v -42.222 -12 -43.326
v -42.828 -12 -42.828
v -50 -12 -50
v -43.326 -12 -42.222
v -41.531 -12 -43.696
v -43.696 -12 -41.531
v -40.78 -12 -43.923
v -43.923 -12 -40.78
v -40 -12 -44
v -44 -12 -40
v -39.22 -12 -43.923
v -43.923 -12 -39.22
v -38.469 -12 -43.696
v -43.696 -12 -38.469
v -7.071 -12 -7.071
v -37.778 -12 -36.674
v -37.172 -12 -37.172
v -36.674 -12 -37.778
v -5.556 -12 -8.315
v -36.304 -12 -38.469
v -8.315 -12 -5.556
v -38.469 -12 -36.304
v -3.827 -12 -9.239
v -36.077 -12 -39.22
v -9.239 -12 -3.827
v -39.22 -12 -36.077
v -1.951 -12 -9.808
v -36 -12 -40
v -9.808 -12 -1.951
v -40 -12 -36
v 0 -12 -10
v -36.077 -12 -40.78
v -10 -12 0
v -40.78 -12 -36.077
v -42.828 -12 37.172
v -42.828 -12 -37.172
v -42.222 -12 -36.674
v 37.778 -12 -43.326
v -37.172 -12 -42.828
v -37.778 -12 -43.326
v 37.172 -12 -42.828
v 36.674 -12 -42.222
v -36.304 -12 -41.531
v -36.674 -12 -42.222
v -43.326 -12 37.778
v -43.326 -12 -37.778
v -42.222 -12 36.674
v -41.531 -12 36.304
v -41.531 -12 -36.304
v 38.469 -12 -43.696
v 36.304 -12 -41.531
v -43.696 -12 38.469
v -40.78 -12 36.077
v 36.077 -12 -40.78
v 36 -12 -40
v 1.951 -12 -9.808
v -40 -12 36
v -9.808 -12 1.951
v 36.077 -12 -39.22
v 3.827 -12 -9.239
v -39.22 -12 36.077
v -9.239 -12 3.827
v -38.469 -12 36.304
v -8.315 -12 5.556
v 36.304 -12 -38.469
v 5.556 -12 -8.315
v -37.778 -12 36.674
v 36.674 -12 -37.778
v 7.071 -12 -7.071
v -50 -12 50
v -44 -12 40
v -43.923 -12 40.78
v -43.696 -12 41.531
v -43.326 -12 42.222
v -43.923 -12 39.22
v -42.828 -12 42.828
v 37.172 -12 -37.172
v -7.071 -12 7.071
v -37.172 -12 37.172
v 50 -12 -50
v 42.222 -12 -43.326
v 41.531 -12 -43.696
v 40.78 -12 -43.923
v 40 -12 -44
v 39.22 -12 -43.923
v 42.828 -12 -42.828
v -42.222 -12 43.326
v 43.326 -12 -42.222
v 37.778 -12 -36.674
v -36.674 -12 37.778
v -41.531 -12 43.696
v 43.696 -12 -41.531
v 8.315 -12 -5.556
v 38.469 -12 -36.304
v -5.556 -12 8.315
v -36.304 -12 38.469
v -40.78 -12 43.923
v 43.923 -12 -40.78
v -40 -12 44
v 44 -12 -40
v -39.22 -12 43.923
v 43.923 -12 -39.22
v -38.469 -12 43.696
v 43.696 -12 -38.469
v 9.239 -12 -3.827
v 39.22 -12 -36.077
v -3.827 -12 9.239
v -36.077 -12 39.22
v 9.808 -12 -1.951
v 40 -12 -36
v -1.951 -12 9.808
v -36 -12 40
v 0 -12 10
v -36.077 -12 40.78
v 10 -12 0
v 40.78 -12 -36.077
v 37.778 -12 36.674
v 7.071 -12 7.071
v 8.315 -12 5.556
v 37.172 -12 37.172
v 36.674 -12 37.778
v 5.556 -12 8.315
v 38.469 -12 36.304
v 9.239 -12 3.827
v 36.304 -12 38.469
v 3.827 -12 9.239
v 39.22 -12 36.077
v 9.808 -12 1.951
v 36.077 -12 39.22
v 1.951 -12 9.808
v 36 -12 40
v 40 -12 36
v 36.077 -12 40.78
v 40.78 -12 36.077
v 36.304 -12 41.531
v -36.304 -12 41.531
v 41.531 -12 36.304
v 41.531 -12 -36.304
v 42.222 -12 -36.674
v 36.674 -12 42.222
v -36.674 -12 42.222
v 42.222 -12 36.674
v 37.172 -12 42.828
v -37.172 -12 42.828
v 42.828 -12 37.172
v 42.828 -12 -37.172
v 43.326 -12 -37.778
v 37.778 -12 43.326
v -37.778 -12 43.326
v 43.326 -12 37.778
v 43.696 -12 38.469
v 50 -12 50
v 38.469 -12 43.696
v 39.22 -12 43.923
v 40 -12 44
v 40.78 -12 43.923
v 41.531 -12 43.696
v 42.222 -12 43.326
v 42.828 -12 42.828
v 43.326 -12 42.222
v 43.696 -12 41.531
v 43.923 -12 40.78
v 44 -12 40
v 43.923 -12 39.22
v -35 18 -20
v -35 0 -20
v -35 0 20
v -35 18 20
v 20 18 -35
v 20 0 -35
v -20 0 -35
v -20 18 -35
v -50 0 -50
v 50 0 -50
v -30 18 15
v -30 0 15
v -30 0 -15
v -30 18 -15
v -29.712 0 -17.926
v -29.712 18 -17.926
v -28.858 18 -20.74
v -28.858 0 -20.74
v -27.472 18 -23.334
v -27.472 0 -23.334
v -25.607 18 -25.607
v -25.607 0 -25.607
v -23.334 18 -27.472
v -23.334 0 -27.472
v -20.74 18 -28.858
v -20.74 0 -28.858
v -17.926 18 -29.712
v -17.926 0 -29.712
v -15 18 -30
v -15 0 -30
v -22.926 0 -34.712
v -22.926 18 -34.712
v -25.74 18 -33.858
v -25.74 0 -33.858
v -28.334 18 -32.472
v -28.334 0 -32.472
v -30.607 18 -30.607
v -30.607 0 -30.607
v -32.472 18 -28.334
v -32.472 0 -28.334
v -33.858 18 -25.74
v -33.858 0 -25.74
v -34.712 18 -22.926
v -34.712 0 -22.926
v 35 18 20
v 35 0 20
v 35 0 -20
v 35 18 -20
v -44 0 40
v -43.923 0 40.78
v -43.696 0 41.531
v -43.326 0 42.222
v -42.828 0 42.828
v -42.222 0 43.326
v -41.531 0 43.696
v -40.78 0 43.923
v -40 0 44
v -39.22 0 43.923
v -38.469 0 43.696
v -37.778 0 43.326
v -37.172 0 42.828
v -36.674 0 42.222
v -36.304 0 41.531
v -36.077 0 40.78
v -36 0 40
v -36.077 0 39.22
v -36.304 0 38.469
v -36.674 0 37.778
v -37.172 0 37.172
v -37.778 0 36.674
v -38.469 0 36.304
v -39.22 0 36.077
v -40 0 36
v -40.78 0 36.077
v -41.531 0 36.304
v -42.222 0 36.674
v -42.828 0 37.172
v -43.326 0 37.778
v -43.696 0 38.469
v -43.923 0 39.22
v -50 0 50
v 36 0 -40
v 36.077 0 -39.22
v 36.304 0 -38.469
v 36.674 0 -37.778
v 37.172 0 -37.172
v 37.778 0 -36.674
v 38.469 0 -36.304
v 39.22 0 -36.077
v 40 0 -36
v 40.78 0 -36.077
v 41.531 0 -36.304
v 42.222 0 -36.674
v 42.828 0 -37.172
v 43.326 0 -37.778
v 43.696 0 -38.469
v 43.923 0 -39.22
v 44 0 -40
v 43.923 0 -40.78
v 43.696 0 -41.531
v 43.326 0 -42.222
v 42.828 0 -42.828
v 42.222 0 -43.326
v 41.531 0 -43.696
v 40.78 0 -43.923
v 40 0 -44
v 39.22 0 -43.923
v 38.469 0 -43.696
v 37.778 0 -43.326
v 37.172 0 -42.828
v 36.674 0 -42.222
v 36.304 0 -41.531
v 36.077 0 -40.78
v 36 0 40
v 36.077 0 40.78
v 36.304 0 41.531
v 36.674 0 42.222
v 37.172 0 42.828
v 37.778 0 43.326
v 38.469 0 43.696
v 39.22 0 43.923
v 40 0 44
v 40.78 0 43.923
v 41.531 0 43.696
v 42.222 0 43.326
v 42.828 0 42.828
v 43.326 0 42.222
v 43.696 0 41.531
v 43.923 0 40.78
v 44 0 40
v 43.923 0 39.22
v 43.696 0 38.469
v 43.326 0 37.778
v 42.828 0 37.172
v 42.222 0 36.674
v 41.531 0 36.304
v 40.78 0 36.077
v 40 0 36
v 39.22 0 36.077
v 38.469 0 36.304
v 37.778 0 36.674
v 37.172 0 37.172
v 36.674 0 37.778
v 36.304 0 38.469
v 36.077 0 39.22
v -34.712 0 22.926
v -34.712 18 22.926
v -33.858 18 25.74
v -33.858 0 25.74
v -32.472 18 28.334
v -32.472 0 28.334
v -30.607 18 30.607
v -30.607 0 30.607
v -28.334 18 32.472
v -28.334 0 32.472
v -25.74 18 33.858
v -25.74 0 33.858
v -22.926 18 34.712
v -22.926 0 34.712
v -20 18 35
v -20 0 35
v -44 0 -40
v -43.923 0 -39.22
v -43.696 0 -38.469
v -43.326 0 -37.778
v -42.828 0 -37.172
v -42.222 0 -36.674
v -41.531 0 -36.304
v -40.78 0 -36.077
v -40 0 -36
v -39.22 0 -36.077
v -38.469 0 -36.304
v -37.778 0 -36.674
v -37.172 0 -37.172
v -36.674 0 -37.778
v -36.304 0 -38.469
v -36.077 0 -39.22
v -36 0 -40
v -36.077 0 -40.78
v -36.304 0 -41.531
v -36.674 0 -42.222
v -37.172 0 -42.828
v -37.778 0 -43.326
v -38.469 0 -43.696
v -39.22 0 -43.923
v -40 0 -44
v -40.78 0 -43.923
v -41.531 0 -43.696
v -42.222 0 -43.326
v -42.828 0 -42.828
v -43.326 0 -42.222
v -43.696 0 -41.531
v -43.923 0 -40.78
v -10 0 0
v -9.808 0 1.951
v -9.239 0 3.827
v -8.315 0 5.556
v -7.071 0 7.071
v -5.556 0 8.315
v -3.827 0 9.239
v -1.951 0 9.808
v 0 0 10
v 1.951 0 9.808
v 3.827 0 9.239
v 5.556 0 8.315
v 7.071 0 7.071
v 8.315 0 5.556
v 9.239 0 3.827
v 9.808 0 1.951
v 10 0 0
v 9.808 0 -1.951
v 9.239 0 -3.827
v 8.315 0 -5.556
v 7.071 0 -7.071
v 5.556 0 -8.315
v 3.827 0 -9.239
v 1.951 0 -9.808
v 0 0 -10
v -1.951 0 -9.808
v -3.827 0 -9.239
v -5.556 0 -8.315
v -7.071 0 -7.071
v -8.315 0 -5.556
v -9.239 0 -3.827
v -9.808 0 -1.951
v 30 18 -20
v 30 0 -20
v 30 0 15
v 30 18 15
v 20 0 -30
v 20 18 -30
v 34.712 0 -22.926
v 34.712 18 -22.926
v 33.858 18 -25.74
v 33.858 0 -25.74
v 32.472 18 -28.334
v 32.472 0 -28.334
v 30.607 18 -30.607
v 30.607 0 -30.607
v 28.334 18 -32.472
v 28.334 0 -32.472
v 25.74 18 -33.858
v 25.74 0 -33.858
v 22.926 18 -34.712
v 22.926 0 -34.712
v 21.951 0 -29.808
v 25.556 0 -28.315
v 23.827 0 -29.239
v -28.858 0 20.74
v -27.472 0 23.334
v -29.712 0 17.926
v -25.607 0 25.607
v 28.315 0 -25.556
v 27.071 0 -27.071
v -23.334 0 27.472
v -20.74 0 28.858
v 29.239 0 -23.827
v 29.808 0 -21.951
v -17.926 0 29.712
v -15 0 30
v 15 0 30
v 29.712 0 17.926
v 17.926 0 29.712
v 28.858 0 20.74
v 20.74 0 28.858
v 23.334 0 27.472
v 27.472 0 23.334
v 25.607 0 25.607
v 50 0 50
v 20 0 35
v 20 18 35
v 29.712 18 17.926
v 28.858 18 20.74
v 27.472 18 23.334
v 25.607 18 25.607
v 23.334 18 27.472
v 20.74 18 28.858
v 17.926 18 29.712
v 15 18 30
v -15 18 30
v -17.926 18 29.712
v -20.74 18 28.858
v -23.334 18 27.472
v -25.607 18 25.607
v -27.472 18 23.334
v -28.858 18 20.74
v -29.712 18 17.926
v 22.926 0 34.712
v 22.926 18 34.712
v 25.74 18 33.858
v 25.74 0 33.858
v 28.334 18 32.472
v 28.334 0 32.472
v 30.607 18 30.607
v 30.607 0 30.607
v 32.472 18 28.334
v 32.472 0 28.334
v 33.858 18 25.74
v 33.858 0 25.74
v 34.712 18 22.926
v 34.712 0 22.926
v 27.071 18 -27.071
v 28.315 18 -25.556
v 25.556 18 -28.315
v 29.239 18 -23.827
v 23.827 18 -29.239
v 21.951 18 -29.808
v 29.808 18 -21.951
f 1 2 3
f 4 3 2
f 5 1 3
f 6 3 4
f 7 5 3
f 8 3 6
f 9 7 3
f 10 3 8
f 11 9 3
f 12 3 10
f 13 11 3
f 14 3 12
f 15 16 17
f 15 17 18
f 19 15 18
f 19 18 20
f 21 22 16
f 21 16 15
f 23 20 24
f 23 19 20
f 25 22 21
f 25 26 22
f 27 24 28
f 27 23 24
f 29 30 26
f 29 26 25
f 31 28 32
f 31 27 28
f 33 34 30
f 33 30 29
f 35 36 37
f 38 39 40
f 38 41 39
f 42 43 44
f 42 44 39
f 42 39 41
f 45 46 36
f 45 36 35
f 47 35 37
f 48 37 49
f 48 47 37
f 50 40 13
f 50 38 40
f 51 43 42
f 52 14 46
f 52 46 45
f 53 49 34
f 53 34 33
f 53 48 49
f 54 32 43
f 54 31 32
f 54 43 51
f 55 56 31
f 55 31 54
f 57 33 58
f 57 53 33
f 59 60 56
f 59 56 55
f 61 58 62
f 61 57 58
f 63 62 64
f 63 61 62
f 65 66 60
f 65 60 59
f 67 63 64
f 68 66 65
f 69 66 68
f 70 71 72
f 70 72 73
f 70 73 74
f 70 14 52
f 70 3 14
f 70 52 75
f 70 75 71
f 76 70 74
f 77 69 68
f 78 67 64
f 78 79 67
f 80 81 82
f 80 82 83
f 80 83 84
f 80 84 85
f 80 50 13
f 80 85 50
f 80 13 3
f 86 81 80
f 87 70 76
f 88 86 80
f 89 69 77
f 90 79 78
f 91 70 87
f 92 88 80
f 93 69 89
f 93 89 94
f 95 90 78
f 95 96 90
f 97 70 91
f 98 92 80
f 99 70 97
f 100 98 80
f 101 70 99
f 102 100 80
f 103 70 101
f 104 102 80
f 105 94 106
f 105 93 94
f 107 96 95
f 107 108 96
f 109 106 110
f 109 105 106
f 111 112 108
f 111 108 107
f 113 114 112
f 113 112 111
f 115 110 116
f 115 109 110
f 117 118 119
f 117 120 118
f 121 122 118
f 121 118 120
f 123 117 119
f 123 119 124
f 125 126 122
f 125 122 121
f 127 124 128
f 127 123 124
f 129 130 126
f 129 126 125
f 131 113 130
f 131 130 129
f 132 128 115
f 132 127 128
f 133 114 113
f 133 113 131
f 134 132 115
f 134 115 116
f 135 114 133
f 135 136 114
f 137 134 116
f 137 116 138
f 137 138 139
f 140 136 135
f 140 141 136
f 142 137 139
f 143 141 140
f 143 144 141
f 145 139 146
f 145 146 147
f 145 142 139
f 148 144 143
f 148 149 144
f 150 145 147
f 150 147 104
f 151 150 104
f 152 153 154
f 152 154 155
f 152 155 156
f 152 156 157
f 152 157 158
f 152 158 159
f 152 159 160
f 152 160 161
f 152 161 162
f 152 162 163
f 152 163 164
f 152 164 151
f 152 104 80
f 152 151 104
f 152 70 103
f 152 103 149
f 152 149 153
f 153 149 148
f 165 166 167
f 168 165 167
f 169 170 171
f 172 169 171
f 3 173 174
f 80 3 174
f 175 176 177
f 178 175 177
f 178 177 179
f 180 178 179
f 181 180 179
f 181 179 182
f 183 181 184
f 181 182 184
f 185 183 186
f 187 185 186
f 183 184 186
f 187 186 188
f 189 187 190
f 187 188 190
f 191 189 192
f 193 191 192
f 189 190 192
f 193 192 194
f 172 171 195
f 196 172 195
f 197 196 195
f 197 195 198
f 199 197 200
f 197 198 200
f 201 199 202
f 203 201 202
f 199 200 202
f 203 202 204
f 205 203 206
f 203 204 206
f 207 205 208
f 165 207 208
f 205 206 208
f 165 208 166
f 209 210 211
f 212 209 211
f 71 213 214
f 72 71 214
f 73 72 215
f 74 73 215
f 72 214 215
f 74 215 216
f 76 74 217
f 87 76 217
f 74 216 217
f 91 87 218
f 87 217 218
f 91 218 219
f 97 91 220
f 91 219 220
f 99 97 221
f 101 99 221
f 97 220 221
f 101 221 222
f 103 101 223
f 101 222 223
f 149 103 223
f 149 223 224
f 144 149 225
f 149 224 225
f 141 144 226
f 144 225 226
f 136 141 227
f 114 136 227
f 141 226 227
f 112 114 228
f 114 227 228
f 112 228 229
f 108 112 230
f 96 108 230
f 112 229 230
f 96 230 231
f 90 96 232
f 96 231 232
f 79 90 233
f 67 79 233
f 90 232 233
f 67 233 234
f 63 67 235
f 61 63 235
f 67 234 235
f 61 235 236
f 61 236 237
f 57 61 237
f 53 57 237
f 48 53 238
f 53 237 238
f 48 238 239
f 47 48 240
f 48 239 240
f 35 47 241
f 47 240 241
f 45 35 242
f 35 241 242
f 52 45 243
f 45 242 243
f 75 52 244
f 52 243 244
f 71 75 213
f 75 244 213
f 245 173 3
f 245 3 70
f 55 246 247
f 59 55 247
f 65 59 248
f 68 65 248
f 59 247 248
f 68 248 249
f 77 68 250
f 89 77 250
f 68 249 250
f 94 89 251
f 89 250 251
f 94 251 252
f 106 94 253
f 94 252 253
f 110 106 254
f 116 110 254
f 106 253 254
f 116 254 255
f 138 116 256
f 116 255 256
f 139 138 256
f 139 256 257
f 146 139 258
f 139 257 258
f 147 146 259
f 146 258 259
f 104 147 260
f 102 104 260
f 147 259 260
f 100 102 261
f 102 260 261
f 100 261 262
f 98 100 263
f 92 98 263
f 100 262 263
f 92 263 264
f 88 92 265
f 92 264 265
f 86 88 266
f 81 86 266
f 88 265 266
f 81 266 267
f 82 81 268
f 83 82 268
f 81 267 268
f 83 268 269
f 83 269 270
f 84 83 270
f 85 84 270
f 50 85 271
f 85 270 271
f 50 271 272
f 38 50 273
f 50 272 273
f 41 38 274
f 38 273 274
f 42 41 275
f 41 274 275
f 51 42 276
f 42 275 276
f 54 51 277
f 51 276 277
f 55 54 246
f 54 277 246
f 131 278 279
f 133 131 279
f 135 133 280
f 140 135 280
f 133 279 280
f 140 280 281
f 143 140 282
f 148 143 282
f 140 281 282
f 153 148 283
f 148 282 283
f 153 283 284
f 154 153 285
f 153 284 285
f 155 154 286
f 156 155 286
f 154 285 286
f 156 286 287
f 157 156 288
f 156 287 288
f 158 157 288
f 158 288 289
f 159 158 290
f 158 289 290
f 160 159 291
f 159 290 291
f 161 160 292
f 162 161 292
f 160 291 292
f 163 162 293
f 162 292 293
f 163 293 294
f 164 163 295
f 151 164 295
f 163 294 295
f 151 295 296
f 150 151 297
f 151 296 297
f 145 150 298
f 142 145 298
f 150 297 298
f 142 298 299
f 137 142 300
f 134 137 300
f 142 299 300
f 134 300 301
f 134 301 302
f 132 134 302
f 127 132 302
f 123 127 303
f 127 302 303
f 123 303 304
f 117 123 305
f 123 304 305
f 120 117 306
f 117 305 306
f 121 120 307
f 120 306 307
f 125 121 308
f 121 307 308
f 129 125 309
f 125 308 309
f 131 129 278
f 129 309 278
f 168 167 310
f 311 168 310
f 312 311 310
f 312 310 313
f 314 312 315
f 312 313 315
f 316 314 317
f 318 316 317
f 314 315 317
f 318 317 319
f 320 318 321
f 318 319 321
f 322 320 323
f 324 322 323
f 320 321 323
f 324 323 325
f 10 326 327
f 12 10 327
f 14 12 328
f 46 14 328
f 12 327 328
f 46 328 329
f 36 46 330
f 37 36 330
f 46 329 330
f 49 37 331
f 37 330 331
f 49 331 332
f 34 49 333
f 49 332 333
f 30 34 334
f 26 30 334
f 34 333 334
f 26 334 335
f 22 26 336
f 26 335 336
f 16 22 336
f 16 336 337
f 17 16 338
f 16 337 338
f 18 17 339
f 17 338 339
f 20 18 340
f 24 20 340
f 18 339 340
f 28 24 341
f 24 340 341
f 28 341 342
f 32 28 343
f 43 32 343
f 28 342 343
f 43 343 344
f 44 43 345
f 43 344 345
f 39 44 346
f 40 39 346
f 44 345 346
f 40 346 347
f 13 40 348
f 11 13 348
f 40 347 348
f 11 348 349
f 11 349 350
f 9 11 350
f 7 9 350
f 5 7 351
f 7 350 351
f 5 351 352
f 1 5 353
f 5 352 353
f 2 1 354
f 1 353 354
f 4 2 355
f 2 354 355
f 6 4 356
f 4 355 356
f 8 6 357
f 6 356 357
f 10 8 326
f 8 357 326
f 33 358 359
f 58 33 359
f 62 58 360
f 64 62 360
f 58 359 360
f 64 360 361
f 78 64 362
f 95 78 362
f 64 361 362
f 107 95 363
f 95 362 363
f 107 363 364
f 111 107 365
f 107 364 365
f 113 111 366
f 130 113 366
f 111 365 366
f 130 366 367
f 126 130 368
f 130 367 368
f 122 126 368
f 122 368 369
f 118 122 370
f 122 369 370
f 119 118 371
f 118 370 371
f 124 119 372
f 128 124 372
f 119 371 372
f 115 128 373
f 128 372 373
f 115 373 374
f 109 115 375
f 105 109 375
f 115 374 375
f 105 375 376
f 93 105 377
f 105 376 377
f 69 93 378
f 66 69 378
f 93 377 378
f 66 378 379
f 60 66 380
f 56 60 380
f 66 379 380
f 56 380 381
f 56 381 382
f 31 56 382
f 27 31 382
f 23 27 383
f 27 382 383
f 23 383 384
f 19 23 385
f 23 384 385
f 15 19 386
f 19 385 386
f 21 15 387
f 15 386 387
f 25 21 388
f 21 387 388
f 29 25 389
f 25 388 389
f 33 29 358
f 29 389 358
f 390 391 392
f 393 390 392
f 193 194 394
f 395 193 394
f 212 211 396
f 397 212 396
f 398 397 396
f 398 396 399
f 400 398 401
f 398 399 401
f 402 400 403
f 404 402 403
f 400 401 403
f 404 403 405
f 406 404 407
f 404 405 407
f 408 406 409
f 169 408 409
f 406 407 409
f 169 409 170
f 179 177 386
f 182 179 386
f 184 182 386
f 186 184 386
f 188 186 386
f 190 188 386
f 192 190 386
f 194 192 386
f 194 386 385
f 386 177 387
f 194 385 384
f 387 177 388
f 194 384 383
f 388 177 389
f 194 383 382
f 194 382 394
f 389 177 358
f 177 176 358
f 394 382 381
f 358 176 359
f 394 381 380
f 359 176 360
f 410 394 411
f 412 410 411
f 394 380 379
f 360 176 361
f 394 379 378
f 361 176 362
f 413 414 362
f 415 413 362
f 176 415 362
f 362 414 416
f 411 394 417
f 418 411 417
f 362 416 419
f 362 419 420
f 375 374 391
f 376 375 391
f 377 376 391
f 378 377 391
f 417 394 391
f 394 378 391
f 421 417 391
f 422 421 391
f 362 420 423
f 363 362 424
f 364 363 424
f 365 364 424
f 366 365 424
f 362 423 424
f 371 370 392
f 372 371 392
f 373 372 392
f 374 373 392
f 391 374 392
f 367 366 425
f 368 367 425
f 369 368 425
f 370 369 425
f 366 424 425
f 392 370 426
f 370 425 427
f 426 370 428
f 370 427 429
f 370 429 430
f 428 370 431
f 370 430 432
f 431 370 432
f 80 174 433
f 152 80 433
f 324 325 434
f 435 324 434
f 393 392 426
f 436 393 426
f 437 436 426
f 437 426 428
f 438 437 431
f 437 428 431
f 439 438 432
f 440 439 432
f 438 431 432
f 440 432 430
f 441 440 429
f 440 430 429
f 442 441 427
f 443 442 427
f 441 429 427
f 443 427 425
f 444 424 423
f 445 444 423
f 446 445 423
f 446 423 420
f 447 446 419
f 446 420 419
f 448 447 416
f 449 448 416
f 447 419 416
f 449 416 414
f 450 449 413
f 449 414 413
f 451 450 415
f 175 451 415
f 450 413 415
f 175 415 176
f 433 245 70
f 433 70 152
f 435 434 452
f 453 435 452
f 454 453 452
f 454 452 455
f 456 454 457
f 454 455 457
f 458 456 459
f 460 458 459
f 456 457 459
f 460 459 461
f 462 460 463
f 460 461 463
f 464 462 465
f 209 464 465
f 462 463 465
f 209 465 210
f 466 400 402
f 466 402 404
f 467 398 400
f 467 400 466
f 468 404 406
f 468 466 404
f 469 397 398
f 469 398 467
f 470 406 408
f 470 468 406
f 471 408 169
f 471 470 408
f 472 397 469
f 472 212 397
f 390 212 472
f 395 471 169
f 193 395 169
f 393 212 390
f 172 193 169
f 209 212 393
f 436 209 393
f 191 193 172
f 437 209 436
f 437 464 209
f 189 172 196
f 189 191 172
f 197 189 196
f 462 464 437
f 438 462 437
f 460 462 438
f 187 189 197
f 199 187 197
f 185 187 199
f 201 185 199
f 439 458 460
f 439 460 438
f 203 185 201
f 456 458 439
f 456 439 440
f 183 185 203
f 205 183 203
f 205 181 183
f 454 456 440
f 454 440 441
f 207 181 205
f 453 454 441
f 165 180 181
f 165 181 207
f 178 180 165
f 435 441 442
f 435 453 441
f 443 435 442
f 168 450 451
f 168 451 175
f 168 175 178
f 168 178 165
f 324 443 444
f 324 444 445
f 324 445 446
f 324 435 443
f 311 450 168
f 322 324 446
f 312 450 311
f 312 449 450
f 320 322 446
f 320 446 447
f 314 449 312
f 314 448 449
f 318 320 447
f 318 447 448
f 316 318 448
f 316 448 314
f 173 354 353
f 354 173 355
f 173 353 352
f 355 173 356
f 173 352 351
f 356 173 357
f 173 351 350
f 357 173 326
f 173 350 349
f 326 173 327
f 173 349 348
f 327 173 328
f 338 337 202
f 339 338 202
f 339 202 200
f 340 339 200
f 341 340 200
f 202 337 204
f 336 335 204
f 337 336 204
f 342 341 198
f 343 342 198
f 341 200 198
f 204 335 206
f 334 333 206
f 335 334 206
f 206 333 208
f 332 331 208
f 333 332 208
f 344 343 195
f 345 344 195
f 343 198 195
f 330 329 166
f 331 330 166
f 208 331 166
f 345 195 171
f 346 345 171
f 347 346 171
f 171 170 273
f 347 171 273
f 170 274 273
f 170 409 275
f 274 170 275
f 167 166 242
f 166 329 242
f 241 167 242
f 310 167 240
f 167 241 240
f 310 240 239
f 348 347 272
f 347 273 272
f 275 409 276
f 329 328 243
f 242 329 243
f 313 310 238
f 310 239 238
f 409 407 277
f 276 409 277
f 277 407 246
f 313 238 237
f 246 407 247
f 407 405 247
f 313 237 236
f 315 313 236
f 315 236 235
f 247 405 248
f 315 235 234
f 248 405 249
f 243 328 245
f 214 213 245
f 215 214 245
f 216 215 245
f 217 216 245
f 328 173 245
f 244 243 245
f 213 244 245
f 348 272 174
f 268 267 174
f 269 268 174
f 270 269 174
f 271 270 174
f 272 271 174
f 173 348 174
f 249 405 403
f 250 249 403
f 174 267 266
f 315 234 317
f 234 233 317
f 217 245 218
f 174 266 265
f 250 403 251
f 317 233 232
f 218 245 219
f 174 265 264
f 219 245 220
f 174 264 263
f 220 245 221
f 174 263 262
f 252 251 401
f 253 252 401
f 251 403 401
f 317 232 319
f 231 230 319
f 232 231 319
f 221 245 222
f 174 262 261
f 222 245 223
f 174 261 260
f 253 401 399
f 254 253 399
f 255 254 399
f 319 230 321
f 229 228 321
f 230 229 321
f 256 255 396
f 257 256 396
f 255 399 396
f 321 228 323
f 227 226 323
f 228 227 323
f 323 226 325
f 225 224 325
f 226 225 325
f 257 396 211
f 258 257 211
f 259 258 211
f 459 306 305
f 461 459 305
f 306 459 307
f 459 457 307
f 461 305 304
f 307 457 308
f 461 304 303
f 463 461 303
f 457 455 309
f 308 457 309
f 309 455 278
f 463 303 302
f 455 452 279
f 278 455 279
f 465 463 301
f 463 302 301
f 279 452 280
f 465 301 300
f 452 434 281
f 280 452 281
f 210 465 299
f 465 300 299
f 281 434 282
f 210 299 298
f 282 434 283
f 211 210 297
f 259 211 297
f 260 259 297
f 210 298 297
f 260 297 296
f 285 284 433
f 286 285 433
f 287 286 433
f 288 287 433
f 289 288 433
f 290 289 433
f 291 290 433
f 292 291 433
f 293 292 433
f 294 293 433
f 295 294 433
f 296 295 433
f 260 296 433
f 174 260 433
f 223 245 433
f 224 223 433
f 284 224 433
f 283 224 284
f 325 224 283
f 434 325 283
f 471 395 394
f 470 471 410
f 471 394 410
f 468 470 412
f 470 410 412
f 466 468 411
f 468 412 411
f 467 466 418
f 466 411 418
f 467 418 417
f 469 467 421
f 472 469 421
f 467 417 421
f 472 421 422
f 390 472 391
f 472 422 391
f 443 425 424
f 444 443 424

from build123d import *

# Parameters (mm, degrees)
F0_W     = 100
F0_H     = 100
F1_DEPTH = 12
F2_R     = 4
F2_R_2   = 10
F3_DEPTH = 12
F5_DEPTH = 18


with BuildPart() as f1:
    # F0 (on Front) → F1 (new body)
    with BuildSketch(Plane.XZ):
        Rectangle(F0_W, F0_H)
    extrude(amount=F1_DEPTH)

    # F2 (on face) → F3 (cut)
    with BuildSketch(Plane(origin=(0, 0, 0), x_dir=(-1, 0, 0), z_dir=(0, 1, 0))):
        with Locations((-40, -40)):
            Circle(F2_R)
        with Locations((-40, 40)):
            Circle(F2_R)
        with Locations((40, -40)):
            Circle(F2_R)
        with Locations((40, 40)):
            Circle(F2_R)
        Circle(F2_R_2)
    extrude(amount=-F3_DEPTH, mode=Mode.SUBTRACT)

    # F4 (on face) → F5 (join)
    with BuildSketch(Plane(origin=(0, 0, 0), x_dir=(-1, 0, 0), z_dir=(0, 1, 0))):
        with BuildLine():
            ThreePointArc((-35, -20), (-30.606602, -30.606602), (-20, -35))
            Line((-20, -35), (20, -35))
            ThreePointArc((20, -35), (30.606602, -30.606602), (35, -20))
            Line((35, -20), (35, 20))
            ThreePointArc((35, 20), (30.606602, 30.606602), (20, 35))
            Line((20, 35), (-20, 35))
            ThreePointArc((-20, 35), (-30.606602, 30.606602), (-35, 20))
            Line((-35, 20), (-35, -20))
        make_face()
        with BuildLine():
            Line((15, -30), (-20, -30))
            ThreePointArc((-20, -30), (-27.071068, -27.071068), (-30, -20))
            Line((-30, -20), (-30, 15))
            ThreePointArc((-30, 15), (-25.606602, 25.606602), (-15, 30))
            Line((-15, 30), (15, 30))
            ThreePointArc((15, 30), (25.606602, 25.606602), (30, 15))
            Line((30, 15), (30, -15))
            ThreePointArc((30, -15), (25.606602, -25.606602), (15, -30))
        make_face(mode=Mode.SUBTRACT)
    extrude(amount=F5_DEPTH)


solid = f1.part
